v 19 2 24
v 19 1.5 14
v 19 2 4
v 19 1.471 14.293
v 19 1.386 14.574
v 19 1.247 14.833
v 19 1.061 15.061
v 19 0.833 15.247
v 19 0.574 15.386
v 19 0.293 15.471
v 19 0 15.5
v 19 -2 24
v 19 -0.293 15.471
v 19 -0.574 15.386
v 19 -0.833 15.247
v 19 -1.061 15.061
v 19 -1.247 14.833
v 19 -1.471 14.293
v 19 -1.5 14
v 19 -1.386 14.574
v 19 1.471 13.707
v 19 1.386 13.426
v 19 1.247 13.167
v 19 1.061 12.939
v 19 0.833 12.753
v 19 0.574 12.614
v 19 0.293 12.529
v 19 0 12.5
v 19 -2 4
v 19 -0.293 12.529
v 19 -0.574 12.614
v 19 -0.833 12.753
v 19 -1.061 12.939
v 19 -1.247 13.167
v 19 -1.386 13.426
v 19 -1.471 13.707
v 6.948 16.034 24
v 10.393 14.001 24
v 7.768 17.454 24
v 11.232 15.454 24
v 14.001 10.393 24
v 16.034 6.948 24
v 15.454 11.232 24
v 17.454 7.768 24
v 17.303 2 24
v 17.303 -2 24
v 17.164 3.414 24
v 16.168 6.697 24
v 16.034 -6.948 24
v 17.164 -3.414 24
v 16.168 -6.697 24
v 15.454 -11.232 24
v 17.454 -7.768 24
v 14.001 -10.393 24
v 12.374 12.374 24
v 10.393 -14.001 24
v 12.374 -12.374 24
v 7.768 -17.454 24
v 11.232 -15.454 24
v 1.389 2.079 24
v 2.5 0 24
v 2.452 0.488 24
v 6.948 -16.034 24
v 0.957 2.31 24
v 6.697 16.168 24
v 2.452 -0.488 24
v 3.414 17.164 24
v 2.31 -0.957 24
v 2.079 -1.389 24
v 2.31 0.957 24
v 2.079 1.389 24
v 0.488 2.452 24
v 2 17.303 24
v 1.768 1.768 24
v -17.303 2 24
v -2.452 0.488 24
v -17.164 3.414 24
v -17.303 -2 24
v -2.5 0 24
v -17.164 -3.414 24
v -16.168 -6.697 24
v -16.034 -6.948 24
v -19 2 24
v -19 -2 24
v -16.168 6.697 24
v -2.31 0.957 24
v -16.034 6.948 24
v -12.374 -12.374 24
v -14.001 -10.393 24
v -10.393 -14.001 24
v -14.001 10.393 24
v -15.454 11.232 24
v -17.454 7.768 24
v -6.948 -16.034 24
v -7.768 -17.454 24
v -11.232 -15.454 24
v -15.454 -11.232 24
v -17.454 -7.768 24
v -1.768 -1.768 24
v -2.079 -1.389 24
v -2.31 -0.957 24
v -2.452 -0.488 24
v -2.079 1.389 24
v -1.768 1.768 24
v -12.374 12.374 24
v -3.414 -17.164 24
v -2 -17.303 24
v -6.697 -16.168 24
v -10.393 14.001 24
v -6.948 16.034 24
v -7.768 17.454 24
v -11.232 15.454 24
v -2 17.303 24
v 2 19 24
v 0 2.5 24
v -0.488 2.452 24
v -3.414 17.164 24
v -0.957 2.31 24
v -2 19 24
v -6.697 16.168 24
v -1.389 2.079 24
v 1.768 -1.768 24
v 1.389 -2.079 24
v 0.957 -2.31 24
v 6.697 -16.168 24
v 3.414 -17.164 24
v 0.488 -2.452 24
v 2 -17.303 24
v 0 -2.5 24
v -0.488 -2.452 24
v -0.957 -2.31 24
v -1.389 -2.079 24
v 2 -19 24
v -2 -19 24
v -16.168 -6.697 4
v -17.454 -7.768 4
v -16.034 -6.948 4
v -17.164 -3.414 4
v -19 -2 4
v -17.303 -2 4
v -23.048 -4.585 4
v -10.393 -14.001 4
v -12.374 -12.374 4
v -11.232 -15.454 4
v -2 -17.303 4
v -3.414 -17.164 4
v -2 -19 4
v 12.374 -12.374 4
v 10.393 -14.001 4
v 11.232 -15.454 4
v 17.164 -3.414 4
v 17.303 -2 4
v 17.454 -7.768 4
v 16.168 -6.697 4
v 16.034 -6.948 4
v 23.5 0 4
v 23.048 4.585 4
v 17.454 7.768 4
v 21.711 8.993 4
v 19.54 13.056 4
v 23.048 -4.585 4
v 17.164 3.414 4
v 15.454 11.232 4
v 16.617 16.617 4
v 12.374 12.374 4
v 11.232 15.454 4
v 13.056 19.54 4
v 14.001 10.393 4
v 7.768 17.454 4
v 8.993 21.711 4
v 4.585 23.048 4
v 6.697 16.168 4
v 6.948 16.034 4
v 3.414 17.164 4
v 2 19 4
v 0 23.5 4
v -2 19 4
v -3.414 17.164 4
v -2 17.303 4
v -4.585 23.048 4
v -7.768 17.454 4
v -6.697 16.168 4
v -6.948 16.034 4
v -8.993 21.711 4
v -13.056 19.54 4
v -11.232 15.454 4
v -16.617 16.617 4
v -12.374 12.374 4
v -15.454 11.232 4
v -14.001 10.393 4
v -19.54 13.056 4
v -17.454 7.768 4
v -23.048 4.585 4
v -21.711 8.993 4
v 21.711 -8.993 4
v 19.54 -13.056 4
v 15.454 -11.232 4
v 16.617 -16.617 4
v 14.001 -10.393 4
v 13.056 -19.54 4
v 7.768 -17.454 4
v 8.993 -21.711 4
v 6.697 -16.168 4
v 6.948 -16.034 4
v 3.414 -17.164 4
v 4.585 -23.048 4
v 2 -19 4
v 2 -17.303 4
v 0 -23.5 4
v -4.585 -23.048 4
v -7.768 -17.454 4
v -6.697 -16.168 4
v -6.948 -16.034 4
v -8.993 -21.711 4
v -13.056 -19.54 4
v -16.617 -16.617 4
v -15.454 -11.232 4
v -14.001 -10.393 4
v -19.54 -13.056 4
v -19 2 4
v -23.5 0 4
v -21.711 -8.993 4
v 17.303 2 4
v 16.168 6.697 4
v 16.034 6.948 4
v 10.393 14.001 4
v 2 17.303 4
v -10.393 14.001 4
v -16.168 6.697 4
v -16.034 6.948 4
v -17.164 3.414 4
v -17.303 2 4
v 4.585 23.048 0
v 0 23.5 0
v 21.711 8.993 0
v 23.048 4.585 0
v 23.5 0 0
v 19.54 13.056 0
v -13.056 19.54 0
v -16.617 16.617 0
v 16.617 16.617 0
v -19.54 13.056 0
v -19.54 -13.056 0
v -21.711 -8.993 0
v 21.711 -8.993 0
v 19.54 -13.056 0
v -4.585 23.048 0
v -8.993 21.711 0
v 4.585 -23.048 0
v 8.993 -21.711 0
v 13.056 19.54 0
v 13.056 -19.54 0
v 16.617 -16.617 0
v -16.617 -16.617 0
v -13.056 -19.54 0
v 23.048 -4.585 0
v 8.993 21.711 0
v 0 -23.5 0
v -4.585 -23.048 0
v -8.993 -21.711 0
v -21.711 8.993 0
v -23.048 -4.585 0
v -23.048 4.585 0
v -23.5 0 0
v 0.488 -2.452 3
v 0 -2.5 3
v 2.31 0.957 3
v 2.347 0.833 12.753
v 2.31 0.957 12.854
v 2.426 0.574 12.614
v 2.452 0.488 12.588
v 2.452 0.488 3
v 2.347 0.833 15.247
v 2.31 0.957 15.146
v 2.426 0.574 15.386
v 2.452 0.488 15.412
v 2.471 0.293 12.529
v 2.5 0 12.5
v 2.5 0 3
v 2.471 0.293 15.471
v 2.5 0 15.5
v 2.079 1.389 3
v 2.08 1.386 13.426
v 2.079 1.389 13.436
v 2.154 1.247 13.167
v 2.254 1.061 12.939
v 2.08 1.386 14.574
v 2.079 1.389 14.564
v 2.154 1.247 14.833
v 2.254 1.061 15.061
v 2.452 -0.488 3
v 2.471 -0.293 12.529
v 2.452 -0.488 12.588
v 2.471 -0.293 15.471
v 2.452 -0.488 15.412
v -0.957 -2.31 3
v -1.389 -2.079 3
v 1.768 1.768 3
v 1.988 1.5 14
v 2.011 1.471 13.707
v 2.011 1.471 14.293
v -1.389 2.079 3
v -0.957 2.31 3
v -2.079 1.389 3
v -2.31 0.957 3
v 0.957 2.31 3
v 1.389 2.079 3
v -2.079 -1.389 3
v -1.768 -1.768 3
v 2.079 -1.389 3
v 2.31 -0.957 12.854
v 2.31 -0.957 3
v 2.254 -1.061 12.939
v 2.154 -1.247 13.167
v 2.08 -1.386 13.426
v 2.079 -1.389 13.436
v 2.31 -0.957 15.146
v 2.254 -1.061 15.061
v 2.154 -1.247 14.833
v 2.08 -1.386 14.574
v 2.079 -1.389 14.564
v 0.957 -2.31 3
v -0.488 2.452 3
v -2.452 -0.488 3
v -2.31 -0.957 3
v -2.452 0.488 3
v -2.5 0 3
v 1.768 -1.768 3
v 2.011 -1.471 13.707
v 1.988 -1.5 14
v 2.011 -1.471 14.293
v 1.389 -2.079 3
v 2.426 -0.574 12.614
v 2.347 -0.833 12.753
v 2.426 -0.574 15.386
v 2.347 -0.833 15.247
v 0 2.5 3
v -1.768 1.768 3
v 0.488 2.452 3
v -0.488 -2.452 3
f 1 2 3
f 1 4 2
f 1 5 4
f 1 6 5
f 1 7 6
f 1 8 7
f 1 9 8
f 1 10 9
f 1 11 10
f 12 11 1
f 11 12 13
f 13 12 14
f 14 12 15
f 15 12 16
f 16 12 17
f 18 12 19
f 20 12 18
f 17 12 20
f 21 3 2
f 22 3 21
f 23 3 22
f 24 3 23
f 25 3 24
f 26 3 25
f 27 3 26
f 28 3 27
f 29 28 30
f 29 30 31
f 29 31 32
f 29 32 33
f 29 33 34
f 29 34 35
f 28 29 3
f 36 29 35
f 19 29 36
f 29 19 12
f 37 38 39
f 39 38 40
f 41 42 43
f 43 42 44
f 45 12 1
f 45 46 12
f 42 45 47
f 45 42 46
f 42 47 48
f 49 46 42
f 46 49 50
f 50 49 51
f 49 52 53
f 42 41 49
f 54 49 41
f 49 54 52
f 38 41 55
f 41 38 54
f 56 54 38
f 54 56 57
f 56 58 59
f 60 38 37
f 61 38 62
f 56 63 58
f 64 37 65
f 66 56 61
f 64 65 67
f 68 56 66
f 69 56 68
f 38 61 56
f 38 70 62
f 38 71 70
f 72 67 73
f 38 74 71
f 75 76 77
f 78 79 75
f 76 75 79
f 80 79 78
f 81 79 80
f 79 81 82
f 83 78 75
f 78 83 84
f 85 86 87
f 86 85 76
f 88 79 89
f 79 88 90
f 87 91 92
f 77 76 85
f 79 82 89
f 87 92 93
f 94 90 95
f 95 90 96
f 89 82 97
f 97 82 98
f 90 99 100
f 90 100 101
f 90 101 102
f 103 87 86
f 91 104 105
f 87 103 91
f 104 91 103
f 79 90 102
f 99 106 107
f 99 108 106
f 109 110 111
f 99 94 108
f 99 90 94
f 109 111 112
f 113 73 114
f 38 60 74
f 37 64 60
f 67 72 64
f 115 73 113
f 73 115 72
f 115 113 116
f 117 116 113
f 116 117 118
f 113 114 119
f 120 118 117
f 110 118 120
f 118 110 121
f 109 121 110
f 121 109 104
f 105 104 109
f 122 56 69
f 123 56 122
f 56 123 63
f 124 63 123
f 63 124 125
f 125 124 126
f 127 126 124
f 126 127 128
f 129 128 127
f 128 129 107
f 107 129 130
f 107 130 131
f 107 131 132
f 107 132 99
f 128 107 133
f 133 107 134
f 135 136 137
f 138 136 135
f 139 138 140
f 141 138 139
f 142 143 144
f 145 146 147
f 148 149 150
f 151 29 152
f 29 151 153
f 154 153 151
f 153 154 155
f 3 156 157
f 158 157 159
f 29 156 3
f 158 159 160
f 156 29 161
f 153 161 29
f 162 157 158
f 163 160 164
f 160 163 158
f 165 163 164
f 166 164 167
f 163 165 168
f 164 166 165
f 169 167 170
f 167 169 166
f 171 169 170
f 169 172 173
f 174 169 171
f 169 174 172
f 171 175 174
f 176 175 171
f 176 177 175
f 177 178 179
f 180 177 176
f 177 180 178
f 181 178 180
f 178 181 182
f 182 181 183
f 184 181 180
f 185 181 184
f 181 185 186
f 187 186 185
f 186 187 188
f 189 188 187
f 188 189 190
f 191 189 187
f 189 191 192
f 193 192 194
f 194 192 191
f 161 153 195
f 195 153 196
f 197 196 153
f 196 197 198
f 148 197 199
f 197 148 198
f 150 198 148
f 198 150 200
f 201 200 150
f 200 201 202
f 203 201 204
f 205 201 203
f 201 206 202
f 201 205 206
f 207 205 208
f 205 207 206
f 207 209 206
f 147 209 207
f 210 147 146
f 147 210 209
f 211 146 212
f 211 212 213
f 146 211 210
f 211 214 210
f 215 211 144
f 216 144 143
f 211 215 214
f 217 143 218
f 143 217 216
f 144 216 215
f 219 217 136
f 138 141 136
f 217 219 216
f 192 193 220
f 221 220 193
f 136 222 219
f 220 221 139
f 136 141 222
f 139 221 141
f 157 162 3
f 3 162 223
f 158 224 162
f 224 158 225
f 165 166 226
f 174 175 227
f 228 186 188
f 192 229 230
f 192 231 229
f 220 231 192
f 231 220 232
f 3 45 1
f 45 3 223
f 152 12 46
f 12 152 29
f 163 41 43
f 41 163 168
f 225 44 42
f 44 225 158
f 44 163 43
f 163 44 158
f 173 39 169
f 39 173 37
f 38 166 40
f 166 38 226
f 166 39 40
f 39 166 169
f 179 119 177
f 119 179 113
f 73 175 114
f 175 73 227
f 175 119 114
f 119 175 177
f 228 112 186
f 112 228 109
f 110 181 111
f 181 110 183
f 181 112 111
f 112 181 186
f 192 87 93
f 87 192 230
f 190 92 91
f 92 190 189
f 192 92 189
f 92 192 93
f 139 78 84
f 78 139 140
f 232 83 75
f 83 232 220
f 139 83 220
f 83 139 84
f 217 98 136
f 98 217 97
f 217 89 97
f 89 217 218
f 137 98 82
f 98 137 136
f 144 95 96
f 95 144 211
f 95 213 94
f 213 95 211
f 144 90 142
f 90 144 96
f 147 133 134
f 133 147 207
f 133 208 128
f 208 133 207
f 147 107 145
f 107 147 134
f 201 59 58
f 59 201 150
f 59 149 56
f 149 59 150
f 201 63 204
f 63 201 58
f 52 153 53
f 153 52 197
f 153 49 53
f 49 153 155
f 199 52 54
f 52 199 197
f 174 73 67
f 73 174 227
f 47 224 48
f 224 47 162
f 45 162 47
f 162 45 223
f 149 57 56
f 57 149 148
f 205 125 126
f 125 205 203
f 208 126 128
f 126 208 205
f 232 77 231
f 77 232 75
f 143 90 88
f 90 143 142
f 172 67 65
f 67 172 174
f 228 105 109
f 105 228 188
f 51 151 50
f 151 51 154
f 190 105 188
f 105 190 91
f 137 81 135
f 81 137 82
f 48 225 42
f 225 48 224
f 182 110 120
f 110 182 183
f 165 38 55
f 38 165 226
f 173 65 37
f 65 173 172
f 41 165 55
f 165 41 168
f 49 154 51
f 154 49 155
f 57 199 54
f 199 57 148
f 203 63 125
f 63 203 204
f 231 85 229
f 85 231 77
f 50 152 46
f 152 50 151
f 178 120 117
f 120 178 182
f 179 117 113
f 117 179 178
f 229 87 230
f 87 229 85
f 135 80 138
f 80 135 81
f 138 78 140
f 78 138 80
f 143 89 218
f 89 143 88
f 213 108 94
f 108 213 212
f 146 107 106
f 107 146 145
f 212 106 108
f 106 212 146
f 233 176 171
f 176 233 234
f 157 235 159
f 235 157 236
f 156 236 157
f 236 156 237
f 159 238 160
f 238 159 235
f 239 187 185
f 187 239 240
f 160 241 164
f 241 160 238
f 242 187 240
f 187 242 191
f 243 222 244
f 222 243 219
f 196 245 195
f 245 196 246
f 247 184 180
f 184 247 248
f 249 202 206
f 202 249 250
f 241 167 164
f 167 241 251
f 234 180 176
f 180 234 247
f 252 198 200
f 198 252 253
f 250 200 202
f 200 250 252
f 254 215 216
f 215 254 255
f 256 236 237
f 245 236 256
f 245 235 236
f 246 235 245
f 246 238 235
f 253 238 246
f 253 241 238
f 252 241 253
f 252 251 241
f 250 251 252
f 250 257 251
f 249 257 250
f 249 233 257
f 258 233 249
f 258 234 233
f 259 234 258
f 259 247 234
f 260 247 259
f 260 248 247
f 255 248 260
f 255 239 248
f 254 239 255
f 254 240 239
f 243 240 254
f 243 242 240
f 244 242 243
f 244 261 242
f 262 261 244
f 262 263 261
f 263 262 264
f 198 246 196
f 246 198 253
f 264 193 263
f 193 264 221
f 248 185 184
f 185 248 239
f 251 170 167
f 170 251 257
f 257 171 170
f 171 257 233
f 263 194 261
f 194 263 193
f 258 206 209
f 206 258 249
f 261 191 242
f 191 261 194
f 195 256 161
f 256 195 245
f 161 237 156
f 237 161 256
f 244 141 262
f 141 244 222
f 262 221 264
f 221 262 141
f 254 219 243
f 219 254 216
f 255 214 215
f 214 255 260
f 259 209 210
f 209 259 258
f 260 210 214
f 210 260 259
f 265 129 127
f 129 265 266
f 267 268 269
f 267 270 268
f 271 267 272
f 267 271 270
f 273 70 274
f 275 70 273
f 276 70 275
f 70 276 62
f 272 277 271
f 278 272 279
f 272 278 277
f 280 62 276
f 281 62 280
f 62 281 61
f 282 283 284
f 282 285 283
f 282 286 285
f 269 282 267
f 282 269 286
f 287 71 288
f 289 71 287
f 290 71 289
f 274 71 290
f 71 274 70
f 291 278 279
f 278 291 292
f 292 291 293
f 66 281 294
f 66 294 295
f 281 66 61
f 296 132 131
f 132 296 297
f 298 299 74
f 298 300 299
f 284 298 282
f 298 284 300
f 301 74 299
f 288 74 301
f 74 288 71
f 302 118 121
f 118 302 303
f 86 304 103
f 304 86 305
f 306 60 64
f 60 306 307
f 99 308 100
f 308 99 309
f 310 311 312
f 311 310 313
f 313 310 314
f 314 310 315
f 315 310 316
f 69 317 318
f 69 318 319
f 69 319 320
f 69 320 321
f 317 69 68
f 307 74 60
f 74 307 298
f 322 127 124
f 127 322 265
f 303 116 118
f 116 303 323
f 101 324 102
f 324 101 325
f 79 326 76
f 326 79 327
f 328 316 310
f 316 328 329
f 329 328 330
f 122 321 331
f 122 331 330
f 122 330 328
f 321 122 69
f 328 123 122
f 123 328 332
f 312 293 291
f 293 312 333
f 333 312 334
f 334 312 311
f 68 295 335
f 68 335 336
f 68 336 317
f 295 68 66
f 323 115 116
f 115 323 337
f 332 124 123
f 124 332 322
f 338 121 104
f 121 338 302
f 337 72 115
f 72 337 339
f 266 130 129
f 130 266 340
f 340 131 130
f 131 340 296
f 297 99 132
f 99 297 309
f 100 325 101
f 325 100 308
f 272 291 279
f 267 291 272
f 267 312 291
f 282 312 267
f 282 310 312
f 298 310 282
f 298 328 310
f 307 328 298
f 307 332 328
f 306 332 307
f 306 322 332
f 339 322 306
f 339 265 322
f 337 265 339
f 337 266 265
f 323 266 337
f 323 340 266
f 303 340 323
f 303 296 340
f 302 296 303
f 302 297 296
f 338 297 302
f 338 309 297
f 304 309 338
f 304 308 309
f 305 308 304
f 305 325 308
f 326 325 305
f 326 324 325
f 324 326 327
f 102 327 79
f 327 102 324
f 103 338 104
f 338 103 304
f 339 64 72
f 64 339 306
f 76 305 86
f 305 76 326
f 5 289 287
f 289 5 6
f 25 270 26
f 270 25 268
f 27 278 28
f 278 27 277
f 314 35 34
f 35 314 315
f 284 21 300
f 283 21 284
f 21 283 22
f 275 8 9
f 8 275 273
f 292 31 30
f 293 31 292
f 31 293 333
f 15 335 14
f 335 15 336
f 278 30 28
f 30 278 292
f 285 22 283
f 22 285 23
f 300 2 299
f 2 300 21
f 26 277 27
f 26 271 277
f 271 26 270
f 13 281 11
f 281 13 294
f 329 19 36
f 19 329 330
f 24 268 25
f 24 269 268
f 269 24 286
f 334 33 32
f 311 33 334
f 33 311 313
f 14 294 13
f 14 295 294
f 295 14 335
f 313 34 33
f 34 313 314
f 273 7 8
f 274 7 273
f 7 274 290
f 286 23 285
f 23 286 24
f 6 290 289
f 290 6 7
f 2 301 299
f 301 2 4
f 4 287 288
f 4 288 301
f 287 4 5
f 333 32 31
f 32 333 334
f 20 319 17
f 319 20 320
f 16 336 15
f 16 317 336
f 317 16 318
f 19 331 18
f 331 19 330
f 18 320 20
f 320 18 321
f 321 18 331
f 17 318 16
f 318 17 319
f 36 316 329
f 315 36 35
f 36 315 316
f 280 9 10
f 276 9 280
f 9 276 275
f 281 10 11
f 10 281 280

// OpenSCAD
$fn = 32;

// ----------------------------------------------------------------------
// Control knob: skirt knob with grip ribs
// ----------------------------------------------------------------------

// --- parameters (mm) ---
skirt_d = 47;             // skirt diameter
skirt_t = 4;              // skirt thickness
rib_w = 4;                // grip rib width
rib_out = 2.5;            // grip rib radial protrusion
n_ribs = 12;              // number of grip ribs
knob_d = 35;              // knob body diameter
knob_h = 20;              // knob body height
bore_d = 5;               // shaft bore diameter
set_d = 3;                // set screw bore diameter
fit_tol = 0.02;           // tolerance for press fits, mm
free_tol = 0.2;           // tolerance for clearance fits, mm

rib_step = 360 / n_ribs;  // rib angular step
total_h = skirt_t + knob_h;  // overall height

difference() {
  union() {
    translate([0, 0, skirt_t]) cylinder(h = knob_h, d = knob_d);
    cylinder(h = skirt_t, d = skirt_d);
    for (i = [0 : n_ribs - 1])
      rotate([0, 0, i * rib_step])
        translate([knob_d / 2 - 1, -rib_w / 2, skirt_t])
          cube([rib_out, rib_w, knob_h]);
  }
  translate([0, 0, skirt_t - 1]) cylinder(h = knob_h + 2, d = bore_d);
  translate([-1, 0, skirt_t + knob_h / 2]) rotate([0, 90, 0])
    cylinder(h = knob_d / 2 + bore_d / 2 + 2, d = set_d);
}
